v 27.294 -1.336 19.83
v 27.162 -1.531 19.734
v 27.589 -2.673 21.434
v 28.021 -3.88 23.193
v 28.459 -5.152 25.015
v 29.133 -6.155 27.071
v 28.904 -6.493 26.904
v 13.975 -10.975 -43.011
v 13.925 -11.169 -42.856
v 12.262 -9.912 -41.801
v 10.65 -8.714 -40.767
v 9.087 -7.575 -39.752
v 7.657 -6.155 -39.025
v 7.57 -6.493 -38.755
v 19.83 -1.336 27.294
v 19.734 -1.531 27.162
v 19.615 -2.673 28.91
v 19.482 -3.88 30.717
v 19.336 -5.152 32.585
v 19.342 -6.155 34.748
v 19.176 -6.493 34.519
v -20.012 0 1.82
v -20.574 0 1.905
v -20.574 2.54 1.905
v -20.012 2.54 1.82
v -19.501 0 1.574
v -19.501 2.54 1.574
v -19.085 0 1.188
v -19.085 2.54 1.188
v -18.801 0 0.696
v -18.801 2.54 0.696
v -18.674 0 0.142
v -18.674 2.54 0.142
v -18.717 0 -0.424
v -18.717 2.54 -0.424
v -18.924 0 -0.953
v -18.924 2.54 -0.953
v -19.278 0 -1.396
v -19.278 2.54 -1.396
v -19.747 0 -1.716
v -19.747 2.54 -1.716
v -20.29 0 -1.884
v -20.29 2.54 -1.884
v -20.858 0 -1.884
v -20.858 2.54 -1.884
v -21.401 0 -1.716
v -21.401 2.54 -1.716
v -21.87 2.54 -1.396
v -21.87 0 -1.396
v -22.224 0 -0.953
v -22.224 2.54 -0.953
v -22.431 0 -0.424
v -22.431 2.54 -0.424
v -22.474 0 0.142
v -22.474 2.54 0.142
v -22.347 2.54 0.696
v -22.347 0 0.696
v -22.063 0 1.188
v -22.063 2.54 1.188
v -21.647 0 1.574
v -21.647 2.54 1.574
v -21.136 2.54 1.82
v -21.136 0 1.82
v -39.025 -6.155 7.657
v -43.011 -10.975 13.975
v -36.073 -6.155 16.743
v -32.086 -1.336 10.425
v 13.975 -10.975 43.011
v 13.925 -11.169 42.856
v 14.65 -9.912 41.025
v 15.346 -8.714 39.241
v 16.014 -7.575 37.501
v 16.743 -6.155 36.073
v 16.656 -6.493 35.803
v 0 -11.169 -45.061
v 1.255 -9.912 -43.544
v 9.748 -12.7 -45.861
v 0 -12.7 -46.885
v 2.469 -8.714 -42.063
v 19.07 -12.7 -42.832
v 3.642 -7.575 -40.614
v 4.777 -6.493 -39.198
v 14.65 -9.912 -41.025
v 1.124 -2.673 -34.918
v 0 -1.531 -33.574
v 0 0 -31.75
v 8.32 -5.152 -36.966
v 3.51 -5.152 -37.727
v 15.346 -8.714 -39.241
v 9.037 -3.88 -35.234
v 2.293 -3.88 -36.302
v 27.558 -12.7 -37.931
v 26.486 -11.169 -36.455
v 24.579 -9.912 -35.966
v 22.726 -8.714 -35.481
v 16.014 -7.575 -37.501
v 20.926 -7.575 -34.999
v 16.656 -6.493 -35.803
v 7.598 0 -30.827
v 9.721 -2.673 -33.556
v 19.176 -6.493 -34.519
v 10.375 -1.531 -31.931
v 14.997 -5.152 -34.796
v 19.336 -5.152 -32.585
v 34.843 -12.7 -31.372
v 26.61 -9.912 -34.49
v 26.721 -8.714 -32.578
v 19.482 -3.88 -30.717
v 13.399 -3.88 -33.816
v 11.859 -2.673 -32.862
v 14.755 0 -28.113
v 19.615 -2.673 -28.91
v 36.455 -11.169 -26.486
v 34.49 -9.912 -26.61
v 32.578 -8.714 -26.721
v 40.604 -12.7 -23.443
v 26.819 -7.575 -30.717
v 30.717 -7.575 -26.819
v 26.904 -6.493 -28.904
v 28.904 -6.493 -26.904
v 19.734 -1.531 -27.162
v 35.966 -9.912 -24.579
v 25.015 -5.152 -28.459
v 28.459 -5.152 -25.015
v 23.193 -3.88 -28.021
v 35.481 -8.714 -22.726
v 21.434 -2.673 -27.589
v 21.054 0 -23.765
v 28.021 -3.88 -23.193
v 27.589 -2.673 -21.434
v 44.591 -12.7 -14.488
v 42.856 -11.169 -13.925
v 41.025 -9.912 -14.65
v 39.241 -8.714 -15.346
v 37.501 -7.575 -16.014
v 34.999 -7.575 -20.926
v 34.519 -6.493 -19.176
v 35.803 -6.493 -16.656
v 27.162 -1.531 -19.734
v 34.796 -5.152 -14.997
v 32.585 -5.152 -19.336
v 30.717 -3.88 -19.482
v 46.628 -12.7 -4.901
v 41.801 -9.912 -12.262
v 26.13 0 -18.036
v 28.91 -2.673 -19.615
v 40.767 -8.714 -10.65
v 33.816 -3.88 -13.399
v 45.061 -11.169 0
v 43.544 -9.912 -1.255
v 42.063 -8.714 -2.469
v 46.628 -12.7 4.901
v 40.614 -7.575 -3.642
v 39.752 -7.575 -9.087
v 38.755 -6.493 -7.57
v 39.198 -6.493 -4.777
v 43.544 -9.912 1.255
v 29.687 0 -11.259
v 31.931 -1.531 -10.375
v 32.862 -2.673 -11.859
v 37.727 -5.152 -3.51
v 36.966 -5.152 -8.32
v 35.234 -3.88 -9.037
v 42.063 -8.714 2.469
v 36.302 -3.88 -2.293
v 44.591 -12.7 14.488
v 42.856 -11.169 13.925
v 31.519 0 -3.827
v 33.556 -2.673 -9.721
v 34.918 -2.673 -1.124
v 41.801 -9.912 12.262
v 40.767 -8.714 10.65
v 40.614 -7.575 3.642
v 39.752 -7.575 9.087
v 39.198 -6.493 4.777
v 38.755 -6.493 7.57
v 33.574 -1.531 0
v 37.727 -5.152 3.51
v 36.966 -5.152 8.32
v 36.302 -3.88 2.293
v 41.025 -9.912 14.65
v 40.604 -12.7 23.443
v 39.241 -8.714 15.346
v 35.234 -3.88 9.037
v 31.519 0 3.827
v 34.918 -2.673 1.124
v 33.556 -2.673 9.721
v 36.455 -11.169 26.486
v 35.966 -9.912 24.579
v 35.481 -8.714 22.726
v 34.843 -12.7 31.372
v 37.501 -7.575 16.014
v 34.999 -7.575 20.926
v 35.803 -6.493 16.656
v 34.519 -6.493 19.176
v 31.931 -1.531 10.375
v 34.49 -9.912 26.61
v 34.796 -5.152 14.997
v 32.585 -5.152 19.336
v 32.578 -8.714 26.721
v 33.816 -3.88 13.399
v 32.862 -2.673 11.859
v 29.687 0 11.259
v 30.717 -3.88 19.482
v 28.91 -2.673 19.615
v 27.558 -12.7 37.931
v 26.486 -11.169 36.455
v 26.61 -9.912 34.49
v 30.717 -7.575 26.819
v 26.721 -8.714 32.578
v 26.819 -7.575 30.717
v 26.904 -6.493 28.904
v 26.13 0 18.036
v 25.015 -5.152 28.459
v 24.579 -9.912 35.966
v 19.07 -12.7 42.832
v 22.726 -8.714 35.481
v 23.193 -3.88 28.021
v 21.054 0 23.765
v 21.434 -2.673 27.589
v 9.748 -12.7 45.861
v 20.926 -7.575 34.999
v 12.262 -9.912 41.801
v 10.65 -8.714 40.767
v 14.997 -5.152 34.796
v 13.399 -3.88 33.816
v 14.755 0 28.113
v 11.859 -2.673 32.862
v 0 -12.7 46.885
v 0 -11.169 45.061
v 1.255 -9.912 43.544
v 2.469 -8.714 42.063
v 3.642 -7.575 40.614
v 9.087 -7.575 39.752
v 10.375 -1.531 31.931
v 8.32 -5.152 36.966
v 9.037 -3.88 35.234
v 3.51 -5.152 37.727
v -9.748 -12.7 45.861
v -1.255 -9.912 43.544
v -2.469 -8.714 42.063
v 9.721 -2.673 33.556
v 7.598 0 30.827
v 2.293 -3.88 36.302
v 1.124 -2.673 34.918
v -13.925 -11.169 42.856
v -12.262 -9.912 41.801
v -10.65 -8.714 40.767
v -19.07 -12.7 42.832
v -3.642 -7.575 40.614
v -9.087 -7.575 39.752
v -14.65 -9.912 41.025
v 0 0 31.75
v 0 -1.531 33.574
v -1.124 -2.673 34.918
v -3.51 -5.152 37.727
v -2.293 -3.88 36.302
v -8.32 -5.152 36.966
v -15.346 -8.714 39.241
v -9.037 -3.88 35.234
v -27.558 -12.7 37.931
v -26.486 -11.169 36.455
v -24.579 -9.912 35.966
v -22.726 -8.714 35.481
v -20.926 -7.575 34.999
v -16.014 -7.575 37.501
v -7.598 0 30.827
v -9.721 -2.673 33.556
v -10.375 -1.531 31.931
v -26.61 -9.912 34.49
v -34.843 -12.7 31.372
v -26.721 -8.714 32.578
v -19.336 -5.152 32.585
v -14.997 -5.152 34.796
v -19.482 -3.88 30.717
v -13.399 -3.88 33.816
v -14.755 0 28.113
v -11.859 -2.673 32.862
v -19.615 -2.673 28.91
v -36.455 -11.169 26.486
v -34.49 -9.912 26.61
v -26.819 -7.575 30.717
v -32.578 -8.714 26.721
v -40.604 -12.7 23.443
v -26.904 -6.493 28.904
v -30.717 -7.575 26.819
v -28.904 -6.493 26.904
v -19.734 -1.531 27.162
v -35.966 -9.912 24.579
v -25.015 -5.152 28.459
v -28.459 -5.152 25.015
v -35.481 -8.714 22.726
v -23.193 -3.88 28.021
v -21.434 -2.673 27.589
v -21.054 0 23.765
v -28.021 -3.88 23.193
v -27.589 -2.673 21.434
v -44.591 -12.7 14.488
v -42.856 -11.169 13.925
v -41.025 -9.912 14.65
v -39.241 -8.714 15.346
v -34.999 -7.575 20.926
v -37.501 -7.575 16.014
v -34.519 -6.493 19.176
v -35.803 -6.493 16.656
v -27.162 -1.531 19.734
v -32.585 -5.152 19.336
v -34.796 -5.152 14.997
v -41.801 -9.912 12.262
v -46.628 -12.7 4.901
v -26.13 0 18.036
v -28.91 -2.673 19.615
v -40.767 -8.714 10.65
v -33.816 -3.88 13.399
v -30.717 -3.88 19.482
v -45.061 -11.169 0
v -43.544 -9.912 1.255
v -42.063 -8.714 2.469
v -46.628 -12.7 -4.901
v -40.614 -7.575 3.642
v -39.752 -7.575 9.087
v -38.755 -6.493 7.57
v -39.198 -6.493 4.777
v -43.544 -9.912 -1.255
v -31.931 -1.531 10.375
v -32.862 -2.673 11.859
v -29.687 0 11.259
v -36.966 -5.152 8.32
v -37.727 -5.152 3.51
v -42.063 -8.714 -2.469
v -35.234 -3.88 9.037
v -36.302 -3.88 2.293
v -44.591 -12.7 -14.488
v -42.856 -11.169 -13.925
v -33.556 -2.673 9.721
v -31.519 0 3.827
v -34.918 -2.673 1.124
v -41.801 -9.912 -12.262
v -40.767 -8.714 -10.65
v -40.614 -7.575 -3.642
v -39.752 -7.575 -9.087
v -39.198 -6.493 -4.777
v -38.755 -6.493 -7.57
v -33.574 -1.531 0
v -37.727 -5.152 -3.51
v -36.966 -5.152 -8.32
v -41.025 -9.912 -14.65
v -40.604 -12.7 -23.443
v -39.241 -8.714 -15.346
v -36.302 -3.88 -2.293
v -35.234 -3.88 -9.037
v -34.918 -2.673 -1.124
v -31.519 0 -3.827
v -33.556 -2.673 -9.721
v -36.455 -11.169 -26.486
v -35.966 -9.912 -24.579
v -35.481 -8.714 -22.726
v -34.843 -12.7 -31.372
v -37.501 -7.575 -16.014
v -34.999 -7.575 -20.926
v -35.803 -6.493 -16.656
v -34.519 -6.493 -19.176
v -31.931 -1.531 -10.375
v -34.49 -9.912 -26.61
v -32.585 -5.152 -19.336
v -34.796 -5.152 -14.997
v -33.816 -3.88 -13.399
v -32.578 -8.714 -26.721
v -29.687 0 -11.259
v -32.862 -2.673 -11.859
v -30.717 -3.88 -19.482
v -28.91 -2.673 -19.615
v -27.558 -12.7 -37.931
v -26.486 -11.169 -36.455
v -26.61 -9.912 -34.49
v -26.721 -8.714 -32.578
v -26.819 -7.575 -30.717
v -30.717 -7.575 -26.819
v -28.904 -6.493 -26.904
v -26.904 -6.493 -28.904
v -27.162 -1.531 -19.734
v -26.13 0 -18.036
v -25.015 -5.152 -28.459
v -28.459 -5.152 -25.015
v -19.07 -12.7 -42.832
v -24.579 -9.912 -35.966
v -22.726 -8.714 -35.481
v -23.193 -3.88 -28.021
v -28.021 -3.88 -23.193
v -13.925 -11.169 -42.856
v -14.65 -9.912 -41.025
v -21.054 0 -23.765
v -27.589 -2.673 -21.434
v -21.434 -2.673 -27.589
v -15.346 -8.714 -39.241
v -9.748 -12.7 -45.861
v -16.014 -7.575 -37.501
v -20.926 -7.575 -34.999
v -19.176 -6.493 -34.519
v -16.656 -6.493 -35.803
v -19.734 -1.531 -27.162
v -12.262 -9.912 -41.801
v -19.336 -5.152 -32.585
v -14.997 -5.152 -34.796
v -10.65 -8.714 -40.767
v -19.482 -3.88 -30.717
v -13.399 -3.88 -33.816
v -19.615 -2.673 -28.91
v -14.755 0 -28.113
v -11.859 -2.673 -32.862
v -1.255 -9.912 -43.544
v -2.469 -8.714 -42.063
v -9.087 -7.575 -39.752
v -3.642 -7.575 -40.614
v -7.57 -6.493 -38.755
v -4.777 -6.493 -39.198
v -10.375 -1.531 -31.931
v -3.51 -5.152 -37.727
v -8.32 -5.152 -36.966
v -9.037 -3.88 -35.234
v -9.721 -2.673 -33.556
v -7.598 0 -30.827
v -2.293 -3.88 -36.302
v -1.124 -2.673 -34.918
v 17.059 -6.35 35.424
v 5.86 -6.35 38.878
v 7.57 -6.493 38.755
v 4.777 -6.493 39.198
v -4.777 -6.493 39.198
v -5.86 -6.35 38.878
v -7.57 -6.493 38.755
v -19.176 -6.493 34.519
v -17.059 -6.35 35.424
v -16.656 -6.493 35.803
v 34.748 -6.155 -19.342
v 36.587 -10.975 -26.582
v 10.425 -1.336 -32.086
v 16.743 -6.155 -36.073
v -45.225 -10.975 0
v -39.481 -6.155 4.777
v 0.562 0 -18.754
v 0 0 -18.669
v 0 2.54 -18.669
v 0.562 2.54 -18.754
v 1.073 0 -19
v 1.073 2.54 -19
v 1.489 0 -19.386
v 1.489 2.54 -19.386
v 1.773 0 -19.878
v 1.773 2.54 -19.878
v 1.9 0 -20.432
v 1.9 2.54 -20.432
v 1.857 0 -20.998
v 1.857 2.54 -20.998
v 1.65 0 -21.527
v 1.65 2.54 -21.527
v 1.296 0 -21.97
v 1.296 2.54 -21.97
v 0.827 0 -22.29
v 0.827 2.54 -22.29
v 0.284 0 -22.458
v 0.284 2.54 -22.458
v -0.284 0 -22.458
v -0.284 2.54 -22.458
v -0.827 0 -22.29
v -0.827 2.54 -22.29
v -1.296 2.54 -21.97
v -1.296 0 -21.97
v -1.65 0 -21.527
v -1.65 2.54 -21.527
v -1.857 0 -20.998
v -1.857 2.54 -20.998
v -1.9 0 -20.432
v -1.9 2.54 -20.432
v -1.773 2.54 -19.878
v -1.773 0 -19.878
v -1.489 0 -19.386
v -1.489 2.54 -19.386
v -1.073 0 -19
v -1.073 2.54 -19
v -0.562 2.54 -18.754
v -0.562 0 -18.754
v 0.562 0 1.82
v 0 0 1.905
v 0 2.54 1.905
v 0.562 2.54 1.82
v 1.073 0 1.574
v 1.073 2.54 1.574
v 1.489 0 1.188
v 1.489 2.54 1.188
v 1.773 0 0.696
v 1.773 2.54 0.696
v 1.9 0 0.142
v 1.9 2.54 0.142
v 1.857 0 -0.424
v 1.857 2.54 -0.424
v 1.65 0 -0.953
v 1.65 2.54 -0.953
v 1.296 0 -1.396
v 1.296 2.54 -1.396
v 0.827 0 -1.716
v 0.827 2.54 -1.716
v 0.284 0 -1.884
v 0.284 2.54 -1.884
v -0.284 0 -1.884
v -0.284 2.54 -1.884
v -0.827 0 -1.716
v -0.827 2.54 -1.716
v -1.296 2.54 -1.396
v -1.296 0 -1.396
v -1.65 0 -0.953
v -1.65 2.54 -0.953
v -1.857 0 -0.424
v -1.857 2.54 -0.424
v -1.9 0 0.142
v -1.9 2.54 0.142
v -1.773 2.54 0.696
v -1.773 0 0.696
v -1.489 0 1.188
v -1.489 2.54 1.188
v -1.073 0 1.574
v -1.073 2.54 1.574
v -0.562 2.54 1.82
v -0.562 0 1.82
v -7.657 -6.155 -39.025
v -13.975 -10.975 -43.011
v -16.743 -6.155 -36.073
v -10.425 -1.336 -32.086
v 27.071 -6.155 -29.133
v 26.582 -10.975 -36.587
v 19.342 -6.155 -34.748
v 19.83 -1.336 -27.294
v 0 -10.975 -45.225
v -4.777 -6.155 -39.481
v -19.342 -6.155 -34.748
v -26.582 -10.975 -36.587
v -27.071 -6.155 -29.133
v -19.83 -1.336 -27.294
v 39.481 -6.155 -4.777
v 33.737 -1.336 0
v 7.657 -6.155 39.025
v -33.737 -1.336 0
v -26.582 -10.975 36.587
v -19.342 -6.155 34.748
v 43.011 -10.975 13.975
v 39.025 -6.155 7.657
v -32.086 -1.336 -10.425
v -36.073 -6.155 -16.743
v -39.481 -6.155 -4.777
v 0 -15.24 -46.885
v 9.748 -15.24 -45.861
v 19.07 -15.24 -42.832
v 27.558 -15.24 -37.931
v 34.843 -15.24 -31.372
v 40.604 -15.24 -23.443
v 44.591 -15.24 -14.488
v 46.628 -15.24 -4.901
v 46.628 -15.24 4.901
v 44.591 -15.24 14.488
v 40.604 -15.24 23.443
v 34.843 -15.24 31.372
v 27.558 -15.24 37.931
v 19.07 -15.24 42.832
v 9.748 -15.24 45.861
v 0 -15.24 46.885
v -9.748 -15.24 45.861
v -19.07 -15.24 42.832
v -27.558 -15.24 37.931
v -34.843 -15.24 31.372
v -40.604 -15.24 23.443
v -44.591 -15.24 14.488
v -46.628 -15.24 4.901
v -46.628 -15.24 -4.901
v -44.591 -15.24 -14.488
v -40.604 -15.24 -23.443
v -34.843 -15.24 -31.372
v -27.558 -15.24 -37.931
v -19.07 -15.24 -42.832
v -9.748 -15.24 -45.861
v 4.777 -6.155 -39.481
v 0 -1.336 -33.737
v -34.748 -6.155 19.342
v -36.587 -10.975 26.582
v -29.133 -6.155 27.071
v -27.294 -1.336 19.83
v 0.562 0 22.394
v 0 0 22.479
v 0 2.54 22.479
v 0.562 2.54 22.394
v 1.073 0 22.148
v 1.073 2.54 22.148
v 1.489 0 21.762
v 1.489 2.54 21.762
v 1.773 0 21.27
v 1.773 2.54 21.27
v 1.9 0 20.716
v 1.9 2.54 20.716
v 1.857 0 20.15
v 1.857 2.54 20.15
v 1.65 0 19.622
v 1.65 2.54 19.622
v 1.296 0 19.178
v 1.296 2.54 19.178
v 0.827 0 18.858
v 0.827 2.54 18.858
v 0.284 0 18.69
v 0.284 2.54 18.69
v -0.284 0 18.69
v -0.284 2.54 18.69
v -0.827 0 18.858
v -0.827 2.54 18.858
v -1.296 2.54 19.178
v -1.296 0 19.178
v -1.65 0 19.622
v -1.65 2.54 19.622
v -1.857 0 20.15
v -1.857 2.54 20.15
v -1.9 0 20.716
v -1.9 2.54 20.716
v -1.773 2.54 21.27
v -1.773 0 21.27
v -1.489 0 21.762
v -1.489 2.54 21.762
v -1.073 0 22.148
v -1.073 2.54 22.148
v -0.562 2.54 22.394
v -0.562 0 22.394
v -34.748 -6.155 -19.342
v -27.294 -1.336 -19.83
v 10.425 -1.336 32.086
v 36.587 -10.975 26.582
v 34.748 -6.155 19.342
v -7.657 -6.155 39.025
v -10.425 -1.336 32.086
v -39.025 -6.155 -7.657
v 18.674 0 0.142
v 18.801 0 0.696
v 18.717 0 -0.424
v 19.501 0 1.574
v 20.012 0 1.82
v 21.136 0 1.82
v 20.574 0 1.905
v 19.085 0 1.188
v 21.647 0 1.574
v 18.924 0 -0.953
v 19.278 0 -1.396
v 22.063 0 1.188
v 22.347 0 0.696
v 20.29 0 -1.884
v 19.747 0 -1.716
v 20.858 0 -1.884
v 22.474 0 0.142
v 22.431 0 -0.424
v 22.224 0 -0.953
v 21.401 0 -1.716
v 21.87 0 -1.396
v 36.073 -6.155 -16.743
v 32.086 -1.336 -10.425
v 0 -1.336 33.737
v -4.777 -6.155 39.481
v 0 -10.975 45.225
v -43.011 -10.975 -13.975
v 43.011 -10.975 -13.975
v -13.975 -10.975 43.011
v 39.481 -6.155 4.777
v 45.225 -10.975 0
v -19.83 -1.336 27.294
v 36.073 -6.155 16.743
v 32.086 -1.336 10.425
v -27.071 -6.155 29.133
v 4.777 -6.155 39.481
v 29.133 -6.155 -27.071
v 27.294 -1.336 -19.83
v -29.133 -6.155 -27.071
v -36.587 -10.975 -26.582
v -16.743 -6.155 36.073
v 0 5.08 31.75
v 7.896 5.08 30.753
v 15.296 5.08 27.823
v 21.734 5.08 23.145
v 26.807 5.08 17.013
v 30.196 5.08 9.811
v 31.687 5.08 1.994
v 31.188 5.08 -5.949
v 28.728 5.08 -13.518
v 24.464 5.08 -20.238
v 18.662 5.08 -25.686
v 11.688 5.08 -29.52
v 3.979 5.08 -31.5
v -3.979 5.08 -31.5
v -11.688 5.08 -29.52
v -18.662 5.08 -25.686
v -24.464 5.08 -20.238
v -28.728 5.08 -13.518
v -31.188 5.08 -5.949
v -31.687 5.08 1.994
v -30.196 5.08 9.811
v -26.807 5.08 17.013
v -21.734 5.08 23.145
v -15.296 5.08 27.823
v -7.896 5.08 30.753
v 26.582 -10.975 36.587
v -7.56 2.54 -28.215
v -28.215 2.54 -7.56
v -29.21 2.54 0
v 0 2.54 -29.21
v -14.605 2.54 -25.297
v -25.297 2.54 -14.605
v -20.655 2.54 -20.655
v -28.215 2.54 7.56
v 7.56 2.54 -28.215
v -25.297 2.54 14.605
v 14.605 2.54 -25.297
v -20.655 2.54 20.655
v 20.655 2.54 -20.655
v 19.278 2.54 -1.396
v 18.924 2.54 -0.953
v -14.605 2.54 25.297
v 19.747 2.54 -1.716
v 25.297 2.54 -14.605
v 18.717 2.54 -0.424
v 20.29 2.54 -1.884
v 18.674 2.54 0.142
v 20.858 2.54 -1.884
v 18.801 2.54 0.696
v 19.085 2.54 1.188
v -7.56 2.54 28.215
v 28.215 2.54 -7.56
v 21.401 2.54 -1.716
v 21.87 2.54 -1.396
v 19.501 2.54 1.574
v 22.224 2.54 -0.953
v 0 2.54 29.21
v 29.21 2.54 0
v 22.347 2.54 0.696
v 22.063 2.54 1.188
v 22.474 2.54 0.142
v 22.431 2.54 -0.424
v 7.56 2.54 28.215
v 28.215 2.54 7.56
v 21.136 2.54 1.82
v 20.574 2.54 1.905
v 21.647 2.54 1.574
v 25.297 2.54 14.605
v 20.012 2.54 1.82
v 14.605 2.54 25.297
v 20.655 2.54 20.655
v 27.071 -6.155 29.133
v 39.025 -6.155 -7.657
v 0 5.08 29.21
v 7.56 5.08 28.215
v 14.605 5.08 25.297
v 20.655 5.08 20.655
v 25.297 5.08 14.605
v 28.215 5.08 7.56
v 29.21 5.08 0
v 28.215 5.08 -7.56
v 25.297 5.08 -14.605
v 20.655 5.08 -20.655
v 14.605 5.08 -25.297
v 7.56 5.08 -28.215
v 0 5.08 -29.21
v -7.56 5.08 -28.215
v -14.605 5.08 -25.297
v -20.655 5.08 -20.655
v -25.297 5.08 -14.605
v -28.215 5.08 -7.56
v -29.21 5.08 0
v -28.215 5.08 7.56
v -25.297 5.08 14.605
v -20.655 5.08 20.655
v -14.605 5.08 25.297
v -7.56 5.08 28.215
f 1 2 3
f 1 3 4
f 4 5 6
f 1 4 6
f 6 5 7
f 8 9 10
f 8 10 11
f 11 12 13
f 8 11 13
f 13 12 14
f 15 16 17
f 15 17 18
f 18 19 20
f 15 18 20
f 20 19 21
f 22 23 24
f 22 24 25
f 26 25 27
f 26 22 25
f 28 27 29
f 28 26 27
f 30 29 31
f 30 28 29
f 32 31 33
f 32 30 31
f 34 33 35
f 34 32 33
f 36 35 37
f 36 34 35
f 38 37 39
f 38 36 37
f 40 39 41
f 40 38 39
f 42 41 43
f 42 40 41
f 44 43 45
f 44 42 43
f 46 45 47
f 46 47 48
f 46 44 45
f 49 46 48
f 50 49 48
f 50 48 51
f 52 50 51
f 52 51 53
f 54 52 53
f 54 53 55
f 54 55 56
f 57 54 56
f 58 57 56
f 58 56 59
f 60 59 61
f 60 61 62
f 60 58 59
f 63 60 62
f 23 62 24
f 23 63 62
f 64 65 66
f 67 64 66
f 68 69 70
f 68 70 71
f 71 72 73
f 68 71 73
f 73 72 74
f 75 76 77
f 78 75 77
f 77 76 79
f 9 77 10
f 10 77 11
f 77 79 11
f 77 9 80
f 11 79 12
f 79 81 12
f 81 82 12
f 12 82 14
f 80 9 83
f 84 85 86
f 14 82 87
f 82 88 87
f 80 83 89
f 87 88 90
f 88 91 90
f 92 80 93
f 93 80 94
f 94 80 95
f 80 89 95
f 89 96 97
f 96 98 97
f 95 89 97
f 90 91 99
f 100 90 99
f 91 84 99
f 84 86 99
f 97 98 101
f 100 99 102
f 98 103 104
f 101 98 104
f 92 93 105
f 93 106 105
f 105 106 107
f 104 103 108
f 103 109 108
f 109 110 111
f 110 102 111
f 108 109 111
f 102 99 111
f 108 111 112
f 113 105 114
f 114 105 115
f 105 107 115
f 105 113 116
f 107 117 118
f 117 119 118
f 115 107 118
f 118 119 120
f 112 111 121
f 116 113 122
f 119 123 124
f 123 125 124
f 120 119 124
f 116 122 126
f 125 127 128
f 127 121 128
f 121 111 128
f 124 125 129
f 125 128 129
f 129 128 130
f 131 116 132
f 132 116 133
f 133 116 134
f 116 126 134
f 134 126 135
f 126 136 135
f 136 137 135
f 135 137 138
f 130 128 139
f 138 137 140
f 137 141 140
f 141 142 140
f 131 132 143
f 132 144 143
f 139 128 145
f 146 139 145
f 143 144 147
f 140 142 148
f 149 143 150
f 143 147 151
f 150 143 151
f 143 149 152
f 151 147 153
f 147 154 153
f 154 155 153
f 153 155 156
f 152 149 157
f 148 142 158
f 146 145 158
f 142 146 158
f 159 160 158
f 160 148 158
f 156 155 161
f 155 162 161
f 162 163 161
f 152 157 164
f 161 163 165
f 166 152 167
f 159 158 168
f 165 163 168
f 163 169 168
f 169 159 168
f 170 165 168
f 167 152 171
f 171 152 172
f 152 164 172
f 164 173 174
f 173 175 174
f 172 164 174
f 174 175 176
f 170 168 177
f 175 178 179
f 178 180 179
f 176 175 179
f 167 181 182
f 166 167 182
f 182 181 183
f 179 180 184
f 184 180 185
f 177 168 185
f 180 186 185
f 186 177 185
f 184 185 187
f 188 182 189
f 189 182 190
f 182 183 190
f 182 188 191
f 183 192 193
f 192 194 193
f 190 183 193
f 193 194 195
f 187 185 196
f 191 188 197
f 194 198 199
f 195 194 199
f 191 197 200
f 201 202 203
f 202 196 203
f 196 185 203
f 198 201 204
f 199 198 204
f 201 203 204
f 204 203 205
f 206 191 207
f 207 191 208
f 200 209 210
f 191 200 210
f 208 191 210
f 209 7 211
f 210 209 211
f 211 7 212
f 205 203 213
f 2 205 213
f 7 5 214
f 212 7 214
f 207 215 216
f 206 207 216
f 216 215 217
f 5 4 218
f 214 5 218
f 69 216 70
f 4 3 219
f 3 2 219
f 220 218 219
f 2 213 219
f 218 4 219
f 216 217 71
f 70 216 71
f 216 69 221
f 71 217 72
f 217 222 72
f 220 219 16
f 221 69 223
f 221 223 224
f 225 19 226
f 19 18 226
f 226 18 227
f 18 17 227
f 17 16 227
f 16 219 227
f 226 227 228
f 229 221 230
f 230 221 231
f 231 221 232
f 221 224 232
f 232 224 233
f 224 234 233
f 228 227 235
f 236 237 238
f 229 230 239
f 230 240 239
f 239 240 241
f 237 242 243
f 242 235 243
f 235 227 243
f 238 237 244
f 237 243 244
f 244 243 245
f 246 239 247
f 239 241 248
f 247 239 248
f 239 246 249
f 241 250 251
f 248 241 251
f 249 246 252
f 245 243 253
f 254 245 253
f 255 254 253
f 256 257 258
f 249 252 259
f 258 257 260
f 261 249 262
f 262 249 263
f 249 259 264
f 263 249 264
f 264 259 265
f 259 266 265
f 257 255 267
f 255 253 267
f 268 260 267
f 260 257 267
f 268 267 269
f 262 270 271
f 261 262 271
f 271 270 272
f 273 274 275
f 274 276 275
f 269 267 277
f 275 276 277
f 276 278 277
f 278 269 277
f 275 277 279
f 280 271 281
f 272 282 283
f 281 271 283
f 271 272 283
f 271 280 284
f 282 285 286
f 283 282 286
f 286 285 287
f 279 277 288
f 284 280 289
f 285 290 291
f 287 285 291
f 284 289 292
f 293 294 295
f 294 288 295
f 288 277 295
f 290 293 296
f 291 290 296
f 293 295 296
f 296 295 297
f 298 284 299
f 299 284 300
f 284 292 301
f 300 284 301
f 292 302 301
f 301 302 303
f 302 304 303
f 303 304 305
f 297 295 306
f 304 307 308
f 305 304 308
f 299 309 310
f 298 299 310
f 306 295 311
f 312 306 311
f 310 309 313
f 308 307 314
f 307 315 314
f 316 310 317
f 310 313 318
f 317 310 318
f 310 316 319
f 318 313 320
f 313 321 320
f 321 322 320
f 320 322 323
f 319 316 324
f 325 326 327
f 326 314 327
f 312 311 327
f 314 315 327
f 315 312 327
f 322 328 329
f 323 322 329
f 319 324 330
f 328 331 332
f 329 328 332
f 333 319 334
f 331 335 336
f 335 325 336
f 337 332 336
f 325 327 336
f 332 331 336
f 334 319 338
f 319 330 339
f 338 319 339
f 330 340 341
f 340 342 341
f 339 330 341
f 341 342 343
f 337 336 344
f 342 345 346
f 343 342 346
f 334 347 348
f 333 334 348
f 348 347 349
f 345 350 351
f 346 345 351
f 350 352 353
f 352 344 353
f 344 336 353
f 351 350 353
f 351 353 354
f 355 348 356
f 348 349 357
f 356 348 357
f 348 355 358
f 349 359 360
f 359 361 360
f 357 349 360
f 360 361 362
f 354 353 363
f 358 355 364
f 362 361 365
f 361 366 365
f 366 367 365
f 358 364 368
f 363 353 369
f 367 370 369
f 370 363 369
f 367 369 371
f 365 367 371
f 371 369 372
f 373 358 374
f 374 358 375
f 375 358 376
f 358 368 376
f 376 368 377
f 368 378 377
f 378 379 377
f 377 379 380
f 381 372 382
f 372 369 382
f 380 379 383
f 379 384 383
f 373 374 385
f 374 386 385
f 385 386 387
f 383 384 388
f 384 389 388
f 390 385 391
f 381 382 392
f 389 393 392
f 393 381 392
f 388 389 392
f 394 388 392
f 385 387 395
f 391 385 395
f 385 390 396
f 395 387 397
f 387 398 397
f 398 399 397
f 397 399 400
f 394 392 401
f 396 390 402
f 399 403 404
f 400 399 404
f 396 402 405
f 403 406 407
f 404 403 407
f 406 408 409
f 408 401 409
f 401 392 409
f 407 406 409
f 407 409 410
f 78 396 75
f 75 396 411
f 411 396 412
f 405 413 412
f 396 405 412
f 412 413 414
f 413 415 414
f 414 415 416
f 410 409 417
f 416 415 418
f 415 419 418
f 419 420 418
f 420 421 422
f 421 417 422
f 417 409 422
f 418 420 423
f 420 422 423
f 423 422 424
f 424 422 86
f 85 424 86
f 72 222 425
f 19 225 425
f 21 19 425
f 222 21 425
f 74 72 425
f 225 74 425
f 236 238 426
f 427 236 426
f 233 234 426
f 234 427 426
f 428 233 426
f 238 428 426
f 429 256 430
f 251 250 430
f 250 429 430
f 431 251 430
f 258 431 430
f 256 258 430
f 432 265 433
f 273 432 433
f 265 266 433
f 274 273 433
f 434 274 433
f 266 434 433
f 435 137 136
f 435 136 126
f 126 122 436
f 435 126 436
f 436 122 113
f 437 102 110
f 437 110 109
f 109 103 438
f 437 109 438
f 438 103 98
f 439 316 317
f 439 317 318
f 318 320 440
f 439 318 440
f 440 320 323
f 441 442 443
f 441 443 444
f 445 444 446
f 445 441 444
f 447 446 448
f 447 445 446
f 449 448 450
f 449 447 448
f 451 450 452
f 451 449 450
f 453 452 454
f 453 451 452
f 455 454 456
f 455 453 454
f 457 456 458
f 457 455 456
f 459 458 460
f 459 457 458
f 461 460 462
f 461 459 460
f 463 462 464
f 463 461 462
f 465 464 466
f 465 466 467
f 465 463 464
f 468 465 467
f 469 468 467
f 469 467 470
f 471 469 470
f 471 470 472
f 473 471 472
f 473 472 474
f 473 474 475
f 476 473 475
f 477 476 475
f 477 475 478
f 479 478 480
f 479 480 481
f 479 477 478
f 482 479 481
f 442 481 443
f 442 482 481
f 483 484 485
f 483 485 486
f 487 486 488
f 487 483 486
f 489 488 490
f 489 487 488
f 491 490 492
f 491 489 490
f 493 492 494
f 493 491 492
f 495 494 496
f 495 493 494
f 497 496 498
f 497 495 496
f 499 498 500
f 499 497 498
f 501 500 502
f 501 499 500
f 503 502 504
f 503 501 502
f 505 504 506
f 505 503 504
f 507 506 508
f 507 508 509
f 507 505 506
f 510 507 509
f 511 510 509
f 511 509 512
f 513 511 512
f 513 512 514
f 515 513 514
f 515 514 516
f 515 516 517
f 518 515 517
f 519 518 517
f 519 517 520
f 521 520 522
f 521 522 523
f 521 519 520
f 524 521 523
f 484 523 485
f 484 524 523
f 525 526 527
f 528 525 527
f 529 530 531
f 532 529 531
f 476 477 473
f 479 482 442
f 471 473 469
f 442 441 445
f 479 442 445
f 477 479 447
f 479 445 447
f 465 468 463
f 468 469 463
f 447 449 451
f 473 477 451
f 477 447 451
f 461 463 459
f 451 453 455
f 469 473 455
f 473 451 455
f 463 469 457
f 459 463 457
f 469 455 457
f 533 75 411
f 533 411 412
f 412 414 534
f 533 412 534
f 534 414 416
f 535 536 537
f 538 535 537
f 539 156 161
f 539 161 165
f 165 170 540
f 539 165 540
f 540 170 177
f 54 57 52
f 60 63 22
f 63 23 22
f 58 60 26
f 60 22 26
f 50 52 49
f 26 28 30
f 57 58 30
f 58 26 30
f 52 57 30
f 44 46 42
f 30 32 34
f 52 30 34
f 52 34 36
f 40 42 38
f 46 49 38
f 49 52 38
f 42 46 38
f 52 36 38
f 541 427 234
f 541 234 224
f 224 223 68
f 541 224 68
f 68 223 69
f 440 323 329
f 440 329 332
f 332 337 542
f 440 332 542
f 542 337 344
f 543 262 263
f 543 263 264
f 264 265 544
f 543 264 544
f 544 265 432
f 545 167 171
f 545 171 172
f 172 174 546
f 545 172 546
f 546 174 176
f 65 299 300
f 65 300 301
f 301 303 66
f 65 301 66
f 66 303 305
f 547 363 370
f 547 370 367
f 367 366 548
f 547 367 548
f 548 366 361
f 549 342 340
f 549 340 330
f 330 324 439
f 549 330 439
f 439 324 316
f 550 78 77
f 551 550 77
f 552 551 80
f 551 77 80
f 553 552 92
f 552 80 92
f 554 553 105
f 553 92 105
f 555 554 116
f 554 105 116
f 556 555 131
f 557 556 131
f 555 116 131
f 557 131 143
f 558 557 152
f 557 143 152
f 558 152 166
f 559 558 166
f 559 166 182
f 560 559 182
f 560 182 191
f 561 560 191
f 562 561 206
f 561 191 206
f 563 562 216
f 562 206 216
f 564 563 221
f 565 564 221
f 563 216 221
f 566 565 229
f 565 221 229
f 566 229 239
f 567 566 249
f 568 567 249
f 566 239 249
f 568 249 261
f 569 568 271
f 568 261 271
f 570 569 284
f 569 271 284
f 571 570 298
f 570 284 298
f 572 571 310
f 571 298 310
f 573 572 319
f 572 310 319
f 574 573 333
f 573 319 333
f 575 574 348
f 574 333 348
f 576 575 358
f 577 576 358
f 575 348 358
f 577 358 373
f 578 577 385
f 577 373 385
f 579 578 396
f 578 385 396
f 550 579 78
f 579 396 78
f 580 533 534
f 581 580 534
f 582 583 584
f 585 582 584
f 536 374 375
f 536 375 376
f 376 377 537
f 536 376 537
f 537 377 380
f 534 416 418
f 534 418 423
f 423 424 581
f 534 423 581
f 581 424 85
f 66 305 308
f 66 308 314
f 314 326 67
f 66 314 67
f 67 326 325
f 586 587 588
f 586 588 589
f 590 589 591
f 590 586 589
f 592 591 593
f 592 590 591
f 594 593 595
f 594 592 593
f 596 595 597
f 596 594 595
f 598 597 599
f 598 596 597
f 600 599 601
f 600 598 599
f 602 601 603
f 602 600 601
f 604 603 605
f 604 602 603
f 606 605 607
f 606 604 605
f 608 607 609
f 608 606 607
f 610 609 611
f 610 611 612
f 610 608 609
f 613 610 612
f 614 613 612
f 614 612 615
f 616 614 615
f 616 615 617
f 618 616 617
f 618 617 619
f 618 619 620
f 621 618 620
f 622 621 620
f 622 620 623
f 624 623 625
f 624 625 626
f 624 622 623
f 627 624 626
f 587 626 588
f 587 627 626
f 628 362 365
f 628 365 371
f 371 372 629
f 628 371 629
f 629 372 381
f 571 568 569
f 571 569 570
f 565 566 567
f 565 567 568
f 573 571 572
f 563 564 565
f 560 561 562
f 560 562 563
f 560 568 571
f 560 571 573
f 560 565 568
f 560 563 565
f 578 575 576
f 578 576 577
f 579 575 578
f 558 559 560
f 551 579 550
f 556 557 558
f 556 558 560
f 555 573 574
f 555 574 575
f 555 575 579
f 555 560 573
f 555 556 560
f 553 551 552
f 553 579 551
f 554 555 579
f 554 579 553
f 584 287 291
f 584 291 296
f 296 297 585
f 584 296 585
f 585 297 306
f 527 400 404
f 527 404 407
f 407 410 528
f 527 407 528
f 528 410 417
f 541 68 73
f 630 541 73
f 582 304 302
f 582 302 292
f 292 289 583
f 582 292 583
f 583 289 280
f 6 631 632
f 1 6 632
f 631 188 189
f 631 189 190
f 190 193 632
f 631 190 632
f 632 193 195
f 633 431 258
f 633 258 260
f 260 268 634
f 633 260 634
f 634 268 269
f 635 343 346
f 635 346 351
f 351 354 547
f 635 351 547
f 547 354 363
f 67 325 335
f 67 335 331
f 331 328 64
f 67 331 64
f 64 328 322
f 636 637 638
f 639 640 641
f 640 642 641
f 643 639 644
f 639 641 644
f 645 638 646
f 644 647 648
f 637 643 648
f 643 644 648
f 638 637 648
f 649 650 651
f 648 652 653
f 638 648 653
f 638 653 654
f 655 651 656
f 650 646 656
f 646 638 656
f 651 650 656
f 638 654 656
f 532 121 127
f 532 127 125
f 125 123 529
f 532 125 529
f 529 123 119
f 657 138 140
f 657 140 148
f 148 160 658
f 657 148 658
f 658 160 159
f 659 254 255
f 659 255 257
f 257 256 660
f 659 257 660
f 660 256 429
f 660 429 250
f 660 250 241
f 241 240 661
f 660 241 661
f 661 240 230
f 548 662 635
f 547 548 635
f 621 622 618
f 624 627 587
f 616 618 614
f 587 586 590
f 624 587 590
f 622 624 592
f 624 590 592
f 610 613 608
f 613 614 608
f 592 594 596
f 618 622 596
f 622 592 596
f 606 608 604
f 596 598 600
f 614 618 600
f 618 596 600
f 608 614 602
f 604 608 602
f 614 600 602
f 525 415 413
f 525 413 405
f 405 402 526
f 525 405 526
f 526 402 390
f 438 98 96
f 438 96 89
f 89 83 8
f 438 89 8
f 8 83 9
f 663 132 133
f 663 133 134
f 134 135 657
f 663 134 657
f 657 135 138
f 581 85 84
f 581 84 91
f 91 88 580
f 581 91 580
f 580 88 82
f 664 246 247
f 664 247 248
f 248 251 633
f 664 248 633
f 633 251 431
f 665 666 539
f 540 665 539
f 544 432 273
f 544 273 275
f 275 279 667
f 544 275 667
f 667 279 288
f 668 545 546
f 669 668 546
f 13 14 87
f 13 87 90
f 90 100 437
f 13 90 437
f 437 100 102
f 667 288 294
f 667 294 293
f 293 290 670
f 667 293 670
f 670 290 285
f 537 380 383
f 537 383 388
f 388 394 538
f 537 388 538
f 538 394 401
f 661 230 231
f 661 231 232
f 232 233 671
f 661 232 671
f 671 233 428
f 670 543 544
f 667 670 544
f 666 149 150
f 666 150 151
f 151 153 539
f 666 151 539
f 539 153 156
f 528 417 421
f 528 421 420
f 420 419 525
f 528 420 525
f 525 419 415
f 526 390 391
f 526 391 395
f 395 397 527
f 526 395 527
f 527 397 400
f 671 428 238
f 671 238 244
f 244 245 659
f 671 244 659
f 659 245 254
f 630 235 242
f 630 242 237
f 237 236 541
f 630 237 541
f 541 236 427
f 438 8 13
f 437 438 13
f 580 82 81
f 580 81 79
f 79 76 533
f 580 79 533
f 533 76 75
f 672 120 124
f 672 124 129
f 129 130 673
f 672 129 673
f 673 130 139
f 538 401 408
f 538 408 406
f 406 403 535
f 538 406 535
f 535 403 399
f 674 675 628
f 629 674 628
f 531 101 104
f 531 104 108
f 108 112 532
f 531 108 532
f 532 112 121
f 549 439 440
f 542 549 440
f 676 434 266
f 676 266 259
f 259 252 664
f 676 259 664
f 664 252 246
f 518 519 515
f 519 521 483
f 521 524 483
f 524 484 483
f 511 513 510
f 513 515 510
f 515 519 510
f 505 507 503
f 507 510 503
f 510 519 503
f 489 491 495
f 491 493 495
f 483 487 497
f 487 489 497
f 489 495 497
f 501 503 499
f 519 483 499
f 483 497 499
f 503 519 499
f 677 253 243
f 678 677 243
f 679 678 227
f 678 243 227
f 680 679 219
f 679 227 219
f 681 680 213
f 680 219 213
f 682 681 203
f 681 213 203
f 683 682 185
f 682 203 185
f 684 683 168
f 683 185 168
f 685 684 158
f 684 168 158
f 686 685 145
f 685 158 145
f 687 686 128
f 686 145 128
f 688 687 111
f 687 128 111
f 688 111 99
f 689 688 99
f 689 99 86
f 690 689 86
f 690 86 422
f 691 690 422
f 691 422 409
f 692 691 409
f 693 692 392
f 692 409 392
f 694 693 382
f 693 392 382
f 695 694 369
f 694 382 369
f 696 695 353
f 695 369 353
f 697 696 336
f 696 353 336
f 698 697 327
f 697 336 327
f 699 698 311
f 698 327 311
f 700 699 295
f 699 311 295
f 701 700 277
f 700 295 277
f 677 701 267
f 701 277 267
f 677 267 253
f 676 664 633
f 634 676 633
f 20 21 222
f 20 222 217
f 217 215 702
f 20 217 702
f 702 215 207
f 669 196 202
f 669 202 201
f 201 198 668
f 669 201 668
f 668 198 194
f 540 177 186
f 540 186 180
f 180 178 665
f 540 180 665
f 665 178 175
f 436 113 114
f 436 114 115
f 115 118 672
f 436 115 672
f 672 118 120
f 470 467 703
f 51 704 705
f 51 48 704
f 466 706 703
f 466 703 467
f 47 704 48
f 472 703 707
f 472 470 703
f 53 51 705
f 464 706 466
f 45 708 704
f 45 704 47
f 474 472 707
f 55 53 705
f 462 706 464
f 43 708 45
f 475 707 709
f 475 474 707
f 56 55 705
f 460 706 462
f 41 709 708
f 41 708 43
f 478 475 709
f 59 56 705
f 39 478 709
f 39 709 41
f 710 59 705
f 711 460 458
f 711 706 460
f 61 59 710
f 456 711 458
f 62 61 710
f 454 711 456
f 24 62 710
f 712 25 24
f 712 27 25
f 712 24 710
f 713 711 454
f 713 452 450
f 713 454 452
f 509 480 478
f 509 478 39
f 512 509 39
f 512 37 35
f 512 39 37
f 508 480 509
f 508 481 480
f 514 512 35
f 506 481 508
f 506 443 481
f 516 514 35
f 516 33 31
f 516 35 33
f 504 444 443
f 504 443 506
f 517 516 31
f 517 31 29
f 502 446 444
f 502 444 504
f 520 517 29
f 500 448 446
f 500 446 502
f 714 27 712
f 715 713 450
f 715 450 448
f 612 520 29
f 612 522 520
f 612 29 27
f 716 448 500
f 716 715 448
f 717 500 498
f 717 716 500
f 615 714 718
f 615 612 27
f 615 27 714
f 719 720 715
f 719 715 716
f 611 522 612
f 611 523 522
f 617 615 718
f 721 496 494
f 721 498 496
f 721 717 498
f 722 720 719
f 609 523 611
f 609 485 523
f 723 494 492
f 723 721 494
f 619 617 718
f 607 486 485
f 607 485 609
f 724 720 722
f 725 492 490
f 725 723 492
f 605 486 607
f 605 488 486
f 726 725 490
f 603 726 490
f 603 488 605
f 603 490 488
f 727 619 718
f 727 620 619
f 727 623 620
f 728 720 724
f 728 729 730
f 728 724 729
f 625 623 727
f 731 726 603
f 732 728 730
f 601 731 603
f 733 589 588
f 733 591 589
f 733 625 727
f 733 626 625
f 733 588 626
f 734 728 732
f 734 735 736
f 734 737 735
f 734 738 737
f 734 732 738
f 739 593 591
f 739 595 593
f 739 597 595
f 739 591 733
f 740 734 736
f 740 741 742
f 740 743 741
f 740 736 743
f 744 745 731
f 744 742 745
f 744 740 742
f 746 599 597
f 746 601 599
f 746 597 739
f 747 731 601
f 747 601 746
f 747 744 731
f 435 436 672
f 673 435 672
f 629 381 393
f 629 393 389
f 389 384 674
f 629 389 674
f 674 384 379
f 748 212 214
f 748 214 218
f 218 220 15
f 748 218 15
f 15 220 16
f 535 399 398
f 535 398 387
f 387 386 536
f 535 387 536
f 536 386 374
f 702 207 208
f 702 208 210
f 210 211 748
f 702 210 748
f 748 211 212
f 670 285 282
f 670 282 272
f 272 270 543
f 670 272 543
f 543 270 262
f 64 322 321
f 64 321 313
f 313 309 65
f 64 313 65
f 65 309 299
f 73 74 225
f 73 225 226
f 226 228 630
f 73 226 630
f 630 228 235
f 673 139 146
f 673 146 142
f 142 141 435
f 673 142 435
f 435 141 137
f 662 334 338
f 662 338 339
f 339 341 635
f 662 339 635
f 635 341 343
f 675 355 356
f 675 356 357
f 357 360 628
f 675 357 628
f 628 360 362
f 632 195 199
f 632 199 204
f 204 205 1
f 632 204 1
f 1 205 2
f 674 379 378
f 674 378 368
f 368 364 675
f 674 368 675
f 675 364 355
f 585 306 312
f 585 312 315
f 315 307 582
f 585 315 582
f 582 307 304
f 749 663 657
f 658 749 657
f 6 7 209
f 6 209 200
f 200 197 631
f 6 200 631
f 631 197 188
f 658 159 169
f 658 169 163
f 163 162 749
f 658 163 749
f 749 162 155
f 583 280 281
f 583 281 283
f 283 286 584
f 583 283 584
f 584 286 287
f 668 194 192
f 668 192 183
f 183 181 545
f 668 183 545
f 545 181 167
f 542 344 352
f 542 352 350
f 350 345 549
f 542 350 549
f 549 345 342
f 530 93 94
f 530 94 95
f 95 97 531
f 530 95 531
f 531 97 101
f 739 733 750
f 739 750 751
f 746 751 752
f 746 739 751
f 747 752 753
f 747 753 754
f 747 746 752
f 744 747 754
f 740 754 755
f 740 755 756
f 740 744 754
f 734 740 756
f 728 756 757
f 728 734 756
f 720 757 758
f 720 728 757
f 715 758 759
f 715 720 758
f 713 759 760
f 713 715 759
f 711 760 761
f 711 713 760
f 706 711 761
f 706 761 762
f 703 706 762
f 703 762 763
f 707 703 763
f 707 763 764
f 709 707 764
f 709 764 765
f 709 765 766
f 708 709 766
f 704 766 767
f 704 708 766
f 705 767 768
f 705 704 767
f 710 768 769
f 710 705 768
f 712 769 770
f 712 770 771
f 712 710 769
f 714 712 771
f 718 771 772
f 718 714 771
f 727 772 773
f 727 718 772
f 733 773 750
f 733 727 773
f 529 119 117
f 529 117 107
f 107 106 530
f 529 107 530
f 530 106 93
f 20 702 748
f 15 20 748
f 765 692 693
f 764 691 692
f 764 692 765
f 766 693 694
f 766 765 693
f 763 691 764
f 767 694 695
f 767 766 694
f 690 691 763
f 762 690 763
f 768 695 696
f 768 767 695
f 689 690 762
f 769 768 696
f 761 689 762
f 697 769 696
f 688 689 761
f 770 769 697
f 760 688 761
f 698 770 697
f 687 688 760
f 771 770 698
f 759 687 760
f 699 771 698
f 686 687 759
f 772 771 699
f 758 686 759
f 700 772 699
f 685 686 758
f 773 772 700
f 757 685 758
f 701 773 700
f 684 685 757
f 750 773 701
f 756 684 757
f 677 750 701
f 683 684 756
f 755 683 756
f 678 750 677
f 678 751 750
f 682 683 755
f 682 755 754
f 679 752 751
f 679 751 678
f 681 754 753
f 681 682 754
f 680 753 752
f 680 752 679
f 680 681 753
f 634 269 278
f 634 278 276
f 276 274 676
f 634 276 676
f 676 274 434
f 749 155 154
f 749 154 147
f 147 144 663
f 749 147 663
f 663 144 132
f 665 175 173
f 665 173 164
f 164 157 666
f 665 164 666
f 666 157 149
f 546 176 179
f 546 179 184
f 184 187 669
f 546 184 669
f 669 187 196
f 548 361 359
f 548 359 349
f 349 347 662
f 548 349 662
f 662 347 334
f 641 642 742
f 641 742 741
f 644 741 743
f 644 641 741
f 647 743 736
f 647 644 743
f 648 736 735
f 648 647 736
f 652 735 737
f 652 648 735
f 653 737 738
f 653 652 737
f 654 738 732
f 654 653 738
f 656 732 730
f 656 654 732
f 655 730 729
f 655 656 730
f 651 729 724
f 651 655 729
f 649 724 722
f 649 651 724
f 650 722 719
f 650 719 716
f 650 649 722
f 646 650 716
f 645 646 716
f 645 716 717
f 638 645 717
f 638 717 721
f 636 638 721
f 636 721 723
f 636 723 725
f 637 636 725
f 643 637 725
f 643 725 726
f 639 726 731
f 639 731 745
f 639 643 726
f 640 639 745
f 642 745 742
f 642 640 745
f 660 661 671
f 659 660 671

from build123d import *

# Parameters (mm, degrees)
SKETCH1_R           = 31.75
SKETCH1_R_2         = 1.905
BOSS_EXTRUDE1_DEPTH = 2.54
SKETCH2_R           = 31.75
SKETCH2_R_2         = 29.21
BOSS_EXTRUDE2_DEPTH = 2.54
SKETCH3_R           = 31.75
BOSS_EXTRUDE3_DEPTH = 12.7
BOSS_EXTRUDE3_DRAFT = -50
SKETCH4_R           = 46.885270626
BOSS_EXTRUDE4_DEPTH = 2.54
BOSS_EXTRUDE5_START = -1.27
BOSS_EXTRUDE5_DEPTH = 1.524
CIRPATTERN1_COUNT   = 20


with BuildPart() as part:
    # Sketch1 → Boss-Extrude1 (new body)
    with BuildSketch(Plane(origin=(0, 0, 0), x_dir=(1, 0, 0), z_dir=(0, 1, 0))):
        with Locations(Location((0, 0, 0), (0, 0, 270))):
            Circle(SKETCH1_R)
        with Locations(Location((0, 20.574, 0), (0, 0, 270))):
            Circle(SKETCH1_R_2, mode=Mode.SUBTRACT)
        with Locations(Location((20.574, 0, 0), (0, 0, 270))):
            Circle(SKETCH1_R_2, mode=Mode.SUBTRACT)
        with Locations(Location((0, -20.574, 0), (0, 0, 270))):
            Circle(SKETCH1_R_2, mode=Mode.SUBTRACT)
        with Locations(Location((-20.574, 0, 0), (0, 0, 270))):
            Circle(SKETCH1_R_2, mode=Mode.SUBTRACT)
        with Locations(Location((0, 0, 0), (0, 0, 270))):
            Circle(SKETCH1_R_2, mode=Mode.SUBTRACT)
    extrude(amount=BOSS_EXTRUDE1_DEPTH)

    # Sketch2 → Boss-Extrude2 (add)
    with BuildSketch(Plane(origin=(0, 2.54, 0), x_dir=(1, 0, 0), z_dir=(0, 1, 0))):
        with Locations(Location((0, 0, 0), (0, 0, 270))):
            Circle(SKETCH2_R)
        with Locations(Location((0, 0, 0), (0, 0, 270))):
            Circle(SKETCH2_R_2, mode=Mode.SUBTRACT)
    extrude(amount=BOSS_EXTRUDE2_DEPTH)


with BuildPart() as boss_extrude3_tool:
    # Sketch3 → Boss-Extrude3 (with draft: the straight prism first)
    with BuildSketch(Plane.XZ):
        with Locations(Location((0, 0, 0), (0, 0, 270))):
            Circle(SKETCH3_R)
    extrude(amount=BOSS_EXTRUDE3_DEPTH)
    # Boss-Extrude3: the draft: its side faces are tilted about the plane it starts from
    boss_extrude3_sides = [boss_extrude3_tool.faces().sort_by_distance(p)[0] for p in [
        (0, -6.35, 31.75),
    ]]
    draft(boss_extrude3_sides, Plane.XZ, BOSS_EXTRUDE3_DRAFT)


with BuildPart() as part_1:
    add(part.part)

    # Boss-Extrude3: add boss_extrude3_tool
    add(boss_extrude3_tool.part)

    # Sketch4 → Boss-Extrude4 (add)
    with BuildSketch(Plane.XZ.offset(12.7)):
        with Locations(Location((0, 0, 0), (0, 0, 270))):
            Circle(SKETCH4_R)
    extrude(amount=BOSS_EXTRUDE4_DEPTH)

    # Sketch6 → Boss-Extrude5 (add)
    with BuildSketch(Plane(origin=(-39.317635313, -6.35, 0), x_dir=(0.7660444431189796, 0.6427876096865376, 0), z_dir=(-0.6427876096865376, 0.7660444431189797, 0)).offset(BOSS_EXTRUDE5_START)):
        Polygon((-7.497749953, 0), (0, -4.776593518), (7.497749953, 0), (0, 4.776593518), align=None)
    boss_extrude5 = extrude(amount=BOSS_EXTRUDE5_DEPTH)

    # CirPattern1: Boss-Extrude5 ×20 about axis
    cirpattern1_axis = Axis((0, 0, 0), (0, 1, 0))
    for i in range(1, CIRPATTERN1_COUNT):
        add(boss_extrude5.rotate(cirpattern1_axis, i * 360 / CIRPATTERN1_COUNT))


solid = part_1.part
